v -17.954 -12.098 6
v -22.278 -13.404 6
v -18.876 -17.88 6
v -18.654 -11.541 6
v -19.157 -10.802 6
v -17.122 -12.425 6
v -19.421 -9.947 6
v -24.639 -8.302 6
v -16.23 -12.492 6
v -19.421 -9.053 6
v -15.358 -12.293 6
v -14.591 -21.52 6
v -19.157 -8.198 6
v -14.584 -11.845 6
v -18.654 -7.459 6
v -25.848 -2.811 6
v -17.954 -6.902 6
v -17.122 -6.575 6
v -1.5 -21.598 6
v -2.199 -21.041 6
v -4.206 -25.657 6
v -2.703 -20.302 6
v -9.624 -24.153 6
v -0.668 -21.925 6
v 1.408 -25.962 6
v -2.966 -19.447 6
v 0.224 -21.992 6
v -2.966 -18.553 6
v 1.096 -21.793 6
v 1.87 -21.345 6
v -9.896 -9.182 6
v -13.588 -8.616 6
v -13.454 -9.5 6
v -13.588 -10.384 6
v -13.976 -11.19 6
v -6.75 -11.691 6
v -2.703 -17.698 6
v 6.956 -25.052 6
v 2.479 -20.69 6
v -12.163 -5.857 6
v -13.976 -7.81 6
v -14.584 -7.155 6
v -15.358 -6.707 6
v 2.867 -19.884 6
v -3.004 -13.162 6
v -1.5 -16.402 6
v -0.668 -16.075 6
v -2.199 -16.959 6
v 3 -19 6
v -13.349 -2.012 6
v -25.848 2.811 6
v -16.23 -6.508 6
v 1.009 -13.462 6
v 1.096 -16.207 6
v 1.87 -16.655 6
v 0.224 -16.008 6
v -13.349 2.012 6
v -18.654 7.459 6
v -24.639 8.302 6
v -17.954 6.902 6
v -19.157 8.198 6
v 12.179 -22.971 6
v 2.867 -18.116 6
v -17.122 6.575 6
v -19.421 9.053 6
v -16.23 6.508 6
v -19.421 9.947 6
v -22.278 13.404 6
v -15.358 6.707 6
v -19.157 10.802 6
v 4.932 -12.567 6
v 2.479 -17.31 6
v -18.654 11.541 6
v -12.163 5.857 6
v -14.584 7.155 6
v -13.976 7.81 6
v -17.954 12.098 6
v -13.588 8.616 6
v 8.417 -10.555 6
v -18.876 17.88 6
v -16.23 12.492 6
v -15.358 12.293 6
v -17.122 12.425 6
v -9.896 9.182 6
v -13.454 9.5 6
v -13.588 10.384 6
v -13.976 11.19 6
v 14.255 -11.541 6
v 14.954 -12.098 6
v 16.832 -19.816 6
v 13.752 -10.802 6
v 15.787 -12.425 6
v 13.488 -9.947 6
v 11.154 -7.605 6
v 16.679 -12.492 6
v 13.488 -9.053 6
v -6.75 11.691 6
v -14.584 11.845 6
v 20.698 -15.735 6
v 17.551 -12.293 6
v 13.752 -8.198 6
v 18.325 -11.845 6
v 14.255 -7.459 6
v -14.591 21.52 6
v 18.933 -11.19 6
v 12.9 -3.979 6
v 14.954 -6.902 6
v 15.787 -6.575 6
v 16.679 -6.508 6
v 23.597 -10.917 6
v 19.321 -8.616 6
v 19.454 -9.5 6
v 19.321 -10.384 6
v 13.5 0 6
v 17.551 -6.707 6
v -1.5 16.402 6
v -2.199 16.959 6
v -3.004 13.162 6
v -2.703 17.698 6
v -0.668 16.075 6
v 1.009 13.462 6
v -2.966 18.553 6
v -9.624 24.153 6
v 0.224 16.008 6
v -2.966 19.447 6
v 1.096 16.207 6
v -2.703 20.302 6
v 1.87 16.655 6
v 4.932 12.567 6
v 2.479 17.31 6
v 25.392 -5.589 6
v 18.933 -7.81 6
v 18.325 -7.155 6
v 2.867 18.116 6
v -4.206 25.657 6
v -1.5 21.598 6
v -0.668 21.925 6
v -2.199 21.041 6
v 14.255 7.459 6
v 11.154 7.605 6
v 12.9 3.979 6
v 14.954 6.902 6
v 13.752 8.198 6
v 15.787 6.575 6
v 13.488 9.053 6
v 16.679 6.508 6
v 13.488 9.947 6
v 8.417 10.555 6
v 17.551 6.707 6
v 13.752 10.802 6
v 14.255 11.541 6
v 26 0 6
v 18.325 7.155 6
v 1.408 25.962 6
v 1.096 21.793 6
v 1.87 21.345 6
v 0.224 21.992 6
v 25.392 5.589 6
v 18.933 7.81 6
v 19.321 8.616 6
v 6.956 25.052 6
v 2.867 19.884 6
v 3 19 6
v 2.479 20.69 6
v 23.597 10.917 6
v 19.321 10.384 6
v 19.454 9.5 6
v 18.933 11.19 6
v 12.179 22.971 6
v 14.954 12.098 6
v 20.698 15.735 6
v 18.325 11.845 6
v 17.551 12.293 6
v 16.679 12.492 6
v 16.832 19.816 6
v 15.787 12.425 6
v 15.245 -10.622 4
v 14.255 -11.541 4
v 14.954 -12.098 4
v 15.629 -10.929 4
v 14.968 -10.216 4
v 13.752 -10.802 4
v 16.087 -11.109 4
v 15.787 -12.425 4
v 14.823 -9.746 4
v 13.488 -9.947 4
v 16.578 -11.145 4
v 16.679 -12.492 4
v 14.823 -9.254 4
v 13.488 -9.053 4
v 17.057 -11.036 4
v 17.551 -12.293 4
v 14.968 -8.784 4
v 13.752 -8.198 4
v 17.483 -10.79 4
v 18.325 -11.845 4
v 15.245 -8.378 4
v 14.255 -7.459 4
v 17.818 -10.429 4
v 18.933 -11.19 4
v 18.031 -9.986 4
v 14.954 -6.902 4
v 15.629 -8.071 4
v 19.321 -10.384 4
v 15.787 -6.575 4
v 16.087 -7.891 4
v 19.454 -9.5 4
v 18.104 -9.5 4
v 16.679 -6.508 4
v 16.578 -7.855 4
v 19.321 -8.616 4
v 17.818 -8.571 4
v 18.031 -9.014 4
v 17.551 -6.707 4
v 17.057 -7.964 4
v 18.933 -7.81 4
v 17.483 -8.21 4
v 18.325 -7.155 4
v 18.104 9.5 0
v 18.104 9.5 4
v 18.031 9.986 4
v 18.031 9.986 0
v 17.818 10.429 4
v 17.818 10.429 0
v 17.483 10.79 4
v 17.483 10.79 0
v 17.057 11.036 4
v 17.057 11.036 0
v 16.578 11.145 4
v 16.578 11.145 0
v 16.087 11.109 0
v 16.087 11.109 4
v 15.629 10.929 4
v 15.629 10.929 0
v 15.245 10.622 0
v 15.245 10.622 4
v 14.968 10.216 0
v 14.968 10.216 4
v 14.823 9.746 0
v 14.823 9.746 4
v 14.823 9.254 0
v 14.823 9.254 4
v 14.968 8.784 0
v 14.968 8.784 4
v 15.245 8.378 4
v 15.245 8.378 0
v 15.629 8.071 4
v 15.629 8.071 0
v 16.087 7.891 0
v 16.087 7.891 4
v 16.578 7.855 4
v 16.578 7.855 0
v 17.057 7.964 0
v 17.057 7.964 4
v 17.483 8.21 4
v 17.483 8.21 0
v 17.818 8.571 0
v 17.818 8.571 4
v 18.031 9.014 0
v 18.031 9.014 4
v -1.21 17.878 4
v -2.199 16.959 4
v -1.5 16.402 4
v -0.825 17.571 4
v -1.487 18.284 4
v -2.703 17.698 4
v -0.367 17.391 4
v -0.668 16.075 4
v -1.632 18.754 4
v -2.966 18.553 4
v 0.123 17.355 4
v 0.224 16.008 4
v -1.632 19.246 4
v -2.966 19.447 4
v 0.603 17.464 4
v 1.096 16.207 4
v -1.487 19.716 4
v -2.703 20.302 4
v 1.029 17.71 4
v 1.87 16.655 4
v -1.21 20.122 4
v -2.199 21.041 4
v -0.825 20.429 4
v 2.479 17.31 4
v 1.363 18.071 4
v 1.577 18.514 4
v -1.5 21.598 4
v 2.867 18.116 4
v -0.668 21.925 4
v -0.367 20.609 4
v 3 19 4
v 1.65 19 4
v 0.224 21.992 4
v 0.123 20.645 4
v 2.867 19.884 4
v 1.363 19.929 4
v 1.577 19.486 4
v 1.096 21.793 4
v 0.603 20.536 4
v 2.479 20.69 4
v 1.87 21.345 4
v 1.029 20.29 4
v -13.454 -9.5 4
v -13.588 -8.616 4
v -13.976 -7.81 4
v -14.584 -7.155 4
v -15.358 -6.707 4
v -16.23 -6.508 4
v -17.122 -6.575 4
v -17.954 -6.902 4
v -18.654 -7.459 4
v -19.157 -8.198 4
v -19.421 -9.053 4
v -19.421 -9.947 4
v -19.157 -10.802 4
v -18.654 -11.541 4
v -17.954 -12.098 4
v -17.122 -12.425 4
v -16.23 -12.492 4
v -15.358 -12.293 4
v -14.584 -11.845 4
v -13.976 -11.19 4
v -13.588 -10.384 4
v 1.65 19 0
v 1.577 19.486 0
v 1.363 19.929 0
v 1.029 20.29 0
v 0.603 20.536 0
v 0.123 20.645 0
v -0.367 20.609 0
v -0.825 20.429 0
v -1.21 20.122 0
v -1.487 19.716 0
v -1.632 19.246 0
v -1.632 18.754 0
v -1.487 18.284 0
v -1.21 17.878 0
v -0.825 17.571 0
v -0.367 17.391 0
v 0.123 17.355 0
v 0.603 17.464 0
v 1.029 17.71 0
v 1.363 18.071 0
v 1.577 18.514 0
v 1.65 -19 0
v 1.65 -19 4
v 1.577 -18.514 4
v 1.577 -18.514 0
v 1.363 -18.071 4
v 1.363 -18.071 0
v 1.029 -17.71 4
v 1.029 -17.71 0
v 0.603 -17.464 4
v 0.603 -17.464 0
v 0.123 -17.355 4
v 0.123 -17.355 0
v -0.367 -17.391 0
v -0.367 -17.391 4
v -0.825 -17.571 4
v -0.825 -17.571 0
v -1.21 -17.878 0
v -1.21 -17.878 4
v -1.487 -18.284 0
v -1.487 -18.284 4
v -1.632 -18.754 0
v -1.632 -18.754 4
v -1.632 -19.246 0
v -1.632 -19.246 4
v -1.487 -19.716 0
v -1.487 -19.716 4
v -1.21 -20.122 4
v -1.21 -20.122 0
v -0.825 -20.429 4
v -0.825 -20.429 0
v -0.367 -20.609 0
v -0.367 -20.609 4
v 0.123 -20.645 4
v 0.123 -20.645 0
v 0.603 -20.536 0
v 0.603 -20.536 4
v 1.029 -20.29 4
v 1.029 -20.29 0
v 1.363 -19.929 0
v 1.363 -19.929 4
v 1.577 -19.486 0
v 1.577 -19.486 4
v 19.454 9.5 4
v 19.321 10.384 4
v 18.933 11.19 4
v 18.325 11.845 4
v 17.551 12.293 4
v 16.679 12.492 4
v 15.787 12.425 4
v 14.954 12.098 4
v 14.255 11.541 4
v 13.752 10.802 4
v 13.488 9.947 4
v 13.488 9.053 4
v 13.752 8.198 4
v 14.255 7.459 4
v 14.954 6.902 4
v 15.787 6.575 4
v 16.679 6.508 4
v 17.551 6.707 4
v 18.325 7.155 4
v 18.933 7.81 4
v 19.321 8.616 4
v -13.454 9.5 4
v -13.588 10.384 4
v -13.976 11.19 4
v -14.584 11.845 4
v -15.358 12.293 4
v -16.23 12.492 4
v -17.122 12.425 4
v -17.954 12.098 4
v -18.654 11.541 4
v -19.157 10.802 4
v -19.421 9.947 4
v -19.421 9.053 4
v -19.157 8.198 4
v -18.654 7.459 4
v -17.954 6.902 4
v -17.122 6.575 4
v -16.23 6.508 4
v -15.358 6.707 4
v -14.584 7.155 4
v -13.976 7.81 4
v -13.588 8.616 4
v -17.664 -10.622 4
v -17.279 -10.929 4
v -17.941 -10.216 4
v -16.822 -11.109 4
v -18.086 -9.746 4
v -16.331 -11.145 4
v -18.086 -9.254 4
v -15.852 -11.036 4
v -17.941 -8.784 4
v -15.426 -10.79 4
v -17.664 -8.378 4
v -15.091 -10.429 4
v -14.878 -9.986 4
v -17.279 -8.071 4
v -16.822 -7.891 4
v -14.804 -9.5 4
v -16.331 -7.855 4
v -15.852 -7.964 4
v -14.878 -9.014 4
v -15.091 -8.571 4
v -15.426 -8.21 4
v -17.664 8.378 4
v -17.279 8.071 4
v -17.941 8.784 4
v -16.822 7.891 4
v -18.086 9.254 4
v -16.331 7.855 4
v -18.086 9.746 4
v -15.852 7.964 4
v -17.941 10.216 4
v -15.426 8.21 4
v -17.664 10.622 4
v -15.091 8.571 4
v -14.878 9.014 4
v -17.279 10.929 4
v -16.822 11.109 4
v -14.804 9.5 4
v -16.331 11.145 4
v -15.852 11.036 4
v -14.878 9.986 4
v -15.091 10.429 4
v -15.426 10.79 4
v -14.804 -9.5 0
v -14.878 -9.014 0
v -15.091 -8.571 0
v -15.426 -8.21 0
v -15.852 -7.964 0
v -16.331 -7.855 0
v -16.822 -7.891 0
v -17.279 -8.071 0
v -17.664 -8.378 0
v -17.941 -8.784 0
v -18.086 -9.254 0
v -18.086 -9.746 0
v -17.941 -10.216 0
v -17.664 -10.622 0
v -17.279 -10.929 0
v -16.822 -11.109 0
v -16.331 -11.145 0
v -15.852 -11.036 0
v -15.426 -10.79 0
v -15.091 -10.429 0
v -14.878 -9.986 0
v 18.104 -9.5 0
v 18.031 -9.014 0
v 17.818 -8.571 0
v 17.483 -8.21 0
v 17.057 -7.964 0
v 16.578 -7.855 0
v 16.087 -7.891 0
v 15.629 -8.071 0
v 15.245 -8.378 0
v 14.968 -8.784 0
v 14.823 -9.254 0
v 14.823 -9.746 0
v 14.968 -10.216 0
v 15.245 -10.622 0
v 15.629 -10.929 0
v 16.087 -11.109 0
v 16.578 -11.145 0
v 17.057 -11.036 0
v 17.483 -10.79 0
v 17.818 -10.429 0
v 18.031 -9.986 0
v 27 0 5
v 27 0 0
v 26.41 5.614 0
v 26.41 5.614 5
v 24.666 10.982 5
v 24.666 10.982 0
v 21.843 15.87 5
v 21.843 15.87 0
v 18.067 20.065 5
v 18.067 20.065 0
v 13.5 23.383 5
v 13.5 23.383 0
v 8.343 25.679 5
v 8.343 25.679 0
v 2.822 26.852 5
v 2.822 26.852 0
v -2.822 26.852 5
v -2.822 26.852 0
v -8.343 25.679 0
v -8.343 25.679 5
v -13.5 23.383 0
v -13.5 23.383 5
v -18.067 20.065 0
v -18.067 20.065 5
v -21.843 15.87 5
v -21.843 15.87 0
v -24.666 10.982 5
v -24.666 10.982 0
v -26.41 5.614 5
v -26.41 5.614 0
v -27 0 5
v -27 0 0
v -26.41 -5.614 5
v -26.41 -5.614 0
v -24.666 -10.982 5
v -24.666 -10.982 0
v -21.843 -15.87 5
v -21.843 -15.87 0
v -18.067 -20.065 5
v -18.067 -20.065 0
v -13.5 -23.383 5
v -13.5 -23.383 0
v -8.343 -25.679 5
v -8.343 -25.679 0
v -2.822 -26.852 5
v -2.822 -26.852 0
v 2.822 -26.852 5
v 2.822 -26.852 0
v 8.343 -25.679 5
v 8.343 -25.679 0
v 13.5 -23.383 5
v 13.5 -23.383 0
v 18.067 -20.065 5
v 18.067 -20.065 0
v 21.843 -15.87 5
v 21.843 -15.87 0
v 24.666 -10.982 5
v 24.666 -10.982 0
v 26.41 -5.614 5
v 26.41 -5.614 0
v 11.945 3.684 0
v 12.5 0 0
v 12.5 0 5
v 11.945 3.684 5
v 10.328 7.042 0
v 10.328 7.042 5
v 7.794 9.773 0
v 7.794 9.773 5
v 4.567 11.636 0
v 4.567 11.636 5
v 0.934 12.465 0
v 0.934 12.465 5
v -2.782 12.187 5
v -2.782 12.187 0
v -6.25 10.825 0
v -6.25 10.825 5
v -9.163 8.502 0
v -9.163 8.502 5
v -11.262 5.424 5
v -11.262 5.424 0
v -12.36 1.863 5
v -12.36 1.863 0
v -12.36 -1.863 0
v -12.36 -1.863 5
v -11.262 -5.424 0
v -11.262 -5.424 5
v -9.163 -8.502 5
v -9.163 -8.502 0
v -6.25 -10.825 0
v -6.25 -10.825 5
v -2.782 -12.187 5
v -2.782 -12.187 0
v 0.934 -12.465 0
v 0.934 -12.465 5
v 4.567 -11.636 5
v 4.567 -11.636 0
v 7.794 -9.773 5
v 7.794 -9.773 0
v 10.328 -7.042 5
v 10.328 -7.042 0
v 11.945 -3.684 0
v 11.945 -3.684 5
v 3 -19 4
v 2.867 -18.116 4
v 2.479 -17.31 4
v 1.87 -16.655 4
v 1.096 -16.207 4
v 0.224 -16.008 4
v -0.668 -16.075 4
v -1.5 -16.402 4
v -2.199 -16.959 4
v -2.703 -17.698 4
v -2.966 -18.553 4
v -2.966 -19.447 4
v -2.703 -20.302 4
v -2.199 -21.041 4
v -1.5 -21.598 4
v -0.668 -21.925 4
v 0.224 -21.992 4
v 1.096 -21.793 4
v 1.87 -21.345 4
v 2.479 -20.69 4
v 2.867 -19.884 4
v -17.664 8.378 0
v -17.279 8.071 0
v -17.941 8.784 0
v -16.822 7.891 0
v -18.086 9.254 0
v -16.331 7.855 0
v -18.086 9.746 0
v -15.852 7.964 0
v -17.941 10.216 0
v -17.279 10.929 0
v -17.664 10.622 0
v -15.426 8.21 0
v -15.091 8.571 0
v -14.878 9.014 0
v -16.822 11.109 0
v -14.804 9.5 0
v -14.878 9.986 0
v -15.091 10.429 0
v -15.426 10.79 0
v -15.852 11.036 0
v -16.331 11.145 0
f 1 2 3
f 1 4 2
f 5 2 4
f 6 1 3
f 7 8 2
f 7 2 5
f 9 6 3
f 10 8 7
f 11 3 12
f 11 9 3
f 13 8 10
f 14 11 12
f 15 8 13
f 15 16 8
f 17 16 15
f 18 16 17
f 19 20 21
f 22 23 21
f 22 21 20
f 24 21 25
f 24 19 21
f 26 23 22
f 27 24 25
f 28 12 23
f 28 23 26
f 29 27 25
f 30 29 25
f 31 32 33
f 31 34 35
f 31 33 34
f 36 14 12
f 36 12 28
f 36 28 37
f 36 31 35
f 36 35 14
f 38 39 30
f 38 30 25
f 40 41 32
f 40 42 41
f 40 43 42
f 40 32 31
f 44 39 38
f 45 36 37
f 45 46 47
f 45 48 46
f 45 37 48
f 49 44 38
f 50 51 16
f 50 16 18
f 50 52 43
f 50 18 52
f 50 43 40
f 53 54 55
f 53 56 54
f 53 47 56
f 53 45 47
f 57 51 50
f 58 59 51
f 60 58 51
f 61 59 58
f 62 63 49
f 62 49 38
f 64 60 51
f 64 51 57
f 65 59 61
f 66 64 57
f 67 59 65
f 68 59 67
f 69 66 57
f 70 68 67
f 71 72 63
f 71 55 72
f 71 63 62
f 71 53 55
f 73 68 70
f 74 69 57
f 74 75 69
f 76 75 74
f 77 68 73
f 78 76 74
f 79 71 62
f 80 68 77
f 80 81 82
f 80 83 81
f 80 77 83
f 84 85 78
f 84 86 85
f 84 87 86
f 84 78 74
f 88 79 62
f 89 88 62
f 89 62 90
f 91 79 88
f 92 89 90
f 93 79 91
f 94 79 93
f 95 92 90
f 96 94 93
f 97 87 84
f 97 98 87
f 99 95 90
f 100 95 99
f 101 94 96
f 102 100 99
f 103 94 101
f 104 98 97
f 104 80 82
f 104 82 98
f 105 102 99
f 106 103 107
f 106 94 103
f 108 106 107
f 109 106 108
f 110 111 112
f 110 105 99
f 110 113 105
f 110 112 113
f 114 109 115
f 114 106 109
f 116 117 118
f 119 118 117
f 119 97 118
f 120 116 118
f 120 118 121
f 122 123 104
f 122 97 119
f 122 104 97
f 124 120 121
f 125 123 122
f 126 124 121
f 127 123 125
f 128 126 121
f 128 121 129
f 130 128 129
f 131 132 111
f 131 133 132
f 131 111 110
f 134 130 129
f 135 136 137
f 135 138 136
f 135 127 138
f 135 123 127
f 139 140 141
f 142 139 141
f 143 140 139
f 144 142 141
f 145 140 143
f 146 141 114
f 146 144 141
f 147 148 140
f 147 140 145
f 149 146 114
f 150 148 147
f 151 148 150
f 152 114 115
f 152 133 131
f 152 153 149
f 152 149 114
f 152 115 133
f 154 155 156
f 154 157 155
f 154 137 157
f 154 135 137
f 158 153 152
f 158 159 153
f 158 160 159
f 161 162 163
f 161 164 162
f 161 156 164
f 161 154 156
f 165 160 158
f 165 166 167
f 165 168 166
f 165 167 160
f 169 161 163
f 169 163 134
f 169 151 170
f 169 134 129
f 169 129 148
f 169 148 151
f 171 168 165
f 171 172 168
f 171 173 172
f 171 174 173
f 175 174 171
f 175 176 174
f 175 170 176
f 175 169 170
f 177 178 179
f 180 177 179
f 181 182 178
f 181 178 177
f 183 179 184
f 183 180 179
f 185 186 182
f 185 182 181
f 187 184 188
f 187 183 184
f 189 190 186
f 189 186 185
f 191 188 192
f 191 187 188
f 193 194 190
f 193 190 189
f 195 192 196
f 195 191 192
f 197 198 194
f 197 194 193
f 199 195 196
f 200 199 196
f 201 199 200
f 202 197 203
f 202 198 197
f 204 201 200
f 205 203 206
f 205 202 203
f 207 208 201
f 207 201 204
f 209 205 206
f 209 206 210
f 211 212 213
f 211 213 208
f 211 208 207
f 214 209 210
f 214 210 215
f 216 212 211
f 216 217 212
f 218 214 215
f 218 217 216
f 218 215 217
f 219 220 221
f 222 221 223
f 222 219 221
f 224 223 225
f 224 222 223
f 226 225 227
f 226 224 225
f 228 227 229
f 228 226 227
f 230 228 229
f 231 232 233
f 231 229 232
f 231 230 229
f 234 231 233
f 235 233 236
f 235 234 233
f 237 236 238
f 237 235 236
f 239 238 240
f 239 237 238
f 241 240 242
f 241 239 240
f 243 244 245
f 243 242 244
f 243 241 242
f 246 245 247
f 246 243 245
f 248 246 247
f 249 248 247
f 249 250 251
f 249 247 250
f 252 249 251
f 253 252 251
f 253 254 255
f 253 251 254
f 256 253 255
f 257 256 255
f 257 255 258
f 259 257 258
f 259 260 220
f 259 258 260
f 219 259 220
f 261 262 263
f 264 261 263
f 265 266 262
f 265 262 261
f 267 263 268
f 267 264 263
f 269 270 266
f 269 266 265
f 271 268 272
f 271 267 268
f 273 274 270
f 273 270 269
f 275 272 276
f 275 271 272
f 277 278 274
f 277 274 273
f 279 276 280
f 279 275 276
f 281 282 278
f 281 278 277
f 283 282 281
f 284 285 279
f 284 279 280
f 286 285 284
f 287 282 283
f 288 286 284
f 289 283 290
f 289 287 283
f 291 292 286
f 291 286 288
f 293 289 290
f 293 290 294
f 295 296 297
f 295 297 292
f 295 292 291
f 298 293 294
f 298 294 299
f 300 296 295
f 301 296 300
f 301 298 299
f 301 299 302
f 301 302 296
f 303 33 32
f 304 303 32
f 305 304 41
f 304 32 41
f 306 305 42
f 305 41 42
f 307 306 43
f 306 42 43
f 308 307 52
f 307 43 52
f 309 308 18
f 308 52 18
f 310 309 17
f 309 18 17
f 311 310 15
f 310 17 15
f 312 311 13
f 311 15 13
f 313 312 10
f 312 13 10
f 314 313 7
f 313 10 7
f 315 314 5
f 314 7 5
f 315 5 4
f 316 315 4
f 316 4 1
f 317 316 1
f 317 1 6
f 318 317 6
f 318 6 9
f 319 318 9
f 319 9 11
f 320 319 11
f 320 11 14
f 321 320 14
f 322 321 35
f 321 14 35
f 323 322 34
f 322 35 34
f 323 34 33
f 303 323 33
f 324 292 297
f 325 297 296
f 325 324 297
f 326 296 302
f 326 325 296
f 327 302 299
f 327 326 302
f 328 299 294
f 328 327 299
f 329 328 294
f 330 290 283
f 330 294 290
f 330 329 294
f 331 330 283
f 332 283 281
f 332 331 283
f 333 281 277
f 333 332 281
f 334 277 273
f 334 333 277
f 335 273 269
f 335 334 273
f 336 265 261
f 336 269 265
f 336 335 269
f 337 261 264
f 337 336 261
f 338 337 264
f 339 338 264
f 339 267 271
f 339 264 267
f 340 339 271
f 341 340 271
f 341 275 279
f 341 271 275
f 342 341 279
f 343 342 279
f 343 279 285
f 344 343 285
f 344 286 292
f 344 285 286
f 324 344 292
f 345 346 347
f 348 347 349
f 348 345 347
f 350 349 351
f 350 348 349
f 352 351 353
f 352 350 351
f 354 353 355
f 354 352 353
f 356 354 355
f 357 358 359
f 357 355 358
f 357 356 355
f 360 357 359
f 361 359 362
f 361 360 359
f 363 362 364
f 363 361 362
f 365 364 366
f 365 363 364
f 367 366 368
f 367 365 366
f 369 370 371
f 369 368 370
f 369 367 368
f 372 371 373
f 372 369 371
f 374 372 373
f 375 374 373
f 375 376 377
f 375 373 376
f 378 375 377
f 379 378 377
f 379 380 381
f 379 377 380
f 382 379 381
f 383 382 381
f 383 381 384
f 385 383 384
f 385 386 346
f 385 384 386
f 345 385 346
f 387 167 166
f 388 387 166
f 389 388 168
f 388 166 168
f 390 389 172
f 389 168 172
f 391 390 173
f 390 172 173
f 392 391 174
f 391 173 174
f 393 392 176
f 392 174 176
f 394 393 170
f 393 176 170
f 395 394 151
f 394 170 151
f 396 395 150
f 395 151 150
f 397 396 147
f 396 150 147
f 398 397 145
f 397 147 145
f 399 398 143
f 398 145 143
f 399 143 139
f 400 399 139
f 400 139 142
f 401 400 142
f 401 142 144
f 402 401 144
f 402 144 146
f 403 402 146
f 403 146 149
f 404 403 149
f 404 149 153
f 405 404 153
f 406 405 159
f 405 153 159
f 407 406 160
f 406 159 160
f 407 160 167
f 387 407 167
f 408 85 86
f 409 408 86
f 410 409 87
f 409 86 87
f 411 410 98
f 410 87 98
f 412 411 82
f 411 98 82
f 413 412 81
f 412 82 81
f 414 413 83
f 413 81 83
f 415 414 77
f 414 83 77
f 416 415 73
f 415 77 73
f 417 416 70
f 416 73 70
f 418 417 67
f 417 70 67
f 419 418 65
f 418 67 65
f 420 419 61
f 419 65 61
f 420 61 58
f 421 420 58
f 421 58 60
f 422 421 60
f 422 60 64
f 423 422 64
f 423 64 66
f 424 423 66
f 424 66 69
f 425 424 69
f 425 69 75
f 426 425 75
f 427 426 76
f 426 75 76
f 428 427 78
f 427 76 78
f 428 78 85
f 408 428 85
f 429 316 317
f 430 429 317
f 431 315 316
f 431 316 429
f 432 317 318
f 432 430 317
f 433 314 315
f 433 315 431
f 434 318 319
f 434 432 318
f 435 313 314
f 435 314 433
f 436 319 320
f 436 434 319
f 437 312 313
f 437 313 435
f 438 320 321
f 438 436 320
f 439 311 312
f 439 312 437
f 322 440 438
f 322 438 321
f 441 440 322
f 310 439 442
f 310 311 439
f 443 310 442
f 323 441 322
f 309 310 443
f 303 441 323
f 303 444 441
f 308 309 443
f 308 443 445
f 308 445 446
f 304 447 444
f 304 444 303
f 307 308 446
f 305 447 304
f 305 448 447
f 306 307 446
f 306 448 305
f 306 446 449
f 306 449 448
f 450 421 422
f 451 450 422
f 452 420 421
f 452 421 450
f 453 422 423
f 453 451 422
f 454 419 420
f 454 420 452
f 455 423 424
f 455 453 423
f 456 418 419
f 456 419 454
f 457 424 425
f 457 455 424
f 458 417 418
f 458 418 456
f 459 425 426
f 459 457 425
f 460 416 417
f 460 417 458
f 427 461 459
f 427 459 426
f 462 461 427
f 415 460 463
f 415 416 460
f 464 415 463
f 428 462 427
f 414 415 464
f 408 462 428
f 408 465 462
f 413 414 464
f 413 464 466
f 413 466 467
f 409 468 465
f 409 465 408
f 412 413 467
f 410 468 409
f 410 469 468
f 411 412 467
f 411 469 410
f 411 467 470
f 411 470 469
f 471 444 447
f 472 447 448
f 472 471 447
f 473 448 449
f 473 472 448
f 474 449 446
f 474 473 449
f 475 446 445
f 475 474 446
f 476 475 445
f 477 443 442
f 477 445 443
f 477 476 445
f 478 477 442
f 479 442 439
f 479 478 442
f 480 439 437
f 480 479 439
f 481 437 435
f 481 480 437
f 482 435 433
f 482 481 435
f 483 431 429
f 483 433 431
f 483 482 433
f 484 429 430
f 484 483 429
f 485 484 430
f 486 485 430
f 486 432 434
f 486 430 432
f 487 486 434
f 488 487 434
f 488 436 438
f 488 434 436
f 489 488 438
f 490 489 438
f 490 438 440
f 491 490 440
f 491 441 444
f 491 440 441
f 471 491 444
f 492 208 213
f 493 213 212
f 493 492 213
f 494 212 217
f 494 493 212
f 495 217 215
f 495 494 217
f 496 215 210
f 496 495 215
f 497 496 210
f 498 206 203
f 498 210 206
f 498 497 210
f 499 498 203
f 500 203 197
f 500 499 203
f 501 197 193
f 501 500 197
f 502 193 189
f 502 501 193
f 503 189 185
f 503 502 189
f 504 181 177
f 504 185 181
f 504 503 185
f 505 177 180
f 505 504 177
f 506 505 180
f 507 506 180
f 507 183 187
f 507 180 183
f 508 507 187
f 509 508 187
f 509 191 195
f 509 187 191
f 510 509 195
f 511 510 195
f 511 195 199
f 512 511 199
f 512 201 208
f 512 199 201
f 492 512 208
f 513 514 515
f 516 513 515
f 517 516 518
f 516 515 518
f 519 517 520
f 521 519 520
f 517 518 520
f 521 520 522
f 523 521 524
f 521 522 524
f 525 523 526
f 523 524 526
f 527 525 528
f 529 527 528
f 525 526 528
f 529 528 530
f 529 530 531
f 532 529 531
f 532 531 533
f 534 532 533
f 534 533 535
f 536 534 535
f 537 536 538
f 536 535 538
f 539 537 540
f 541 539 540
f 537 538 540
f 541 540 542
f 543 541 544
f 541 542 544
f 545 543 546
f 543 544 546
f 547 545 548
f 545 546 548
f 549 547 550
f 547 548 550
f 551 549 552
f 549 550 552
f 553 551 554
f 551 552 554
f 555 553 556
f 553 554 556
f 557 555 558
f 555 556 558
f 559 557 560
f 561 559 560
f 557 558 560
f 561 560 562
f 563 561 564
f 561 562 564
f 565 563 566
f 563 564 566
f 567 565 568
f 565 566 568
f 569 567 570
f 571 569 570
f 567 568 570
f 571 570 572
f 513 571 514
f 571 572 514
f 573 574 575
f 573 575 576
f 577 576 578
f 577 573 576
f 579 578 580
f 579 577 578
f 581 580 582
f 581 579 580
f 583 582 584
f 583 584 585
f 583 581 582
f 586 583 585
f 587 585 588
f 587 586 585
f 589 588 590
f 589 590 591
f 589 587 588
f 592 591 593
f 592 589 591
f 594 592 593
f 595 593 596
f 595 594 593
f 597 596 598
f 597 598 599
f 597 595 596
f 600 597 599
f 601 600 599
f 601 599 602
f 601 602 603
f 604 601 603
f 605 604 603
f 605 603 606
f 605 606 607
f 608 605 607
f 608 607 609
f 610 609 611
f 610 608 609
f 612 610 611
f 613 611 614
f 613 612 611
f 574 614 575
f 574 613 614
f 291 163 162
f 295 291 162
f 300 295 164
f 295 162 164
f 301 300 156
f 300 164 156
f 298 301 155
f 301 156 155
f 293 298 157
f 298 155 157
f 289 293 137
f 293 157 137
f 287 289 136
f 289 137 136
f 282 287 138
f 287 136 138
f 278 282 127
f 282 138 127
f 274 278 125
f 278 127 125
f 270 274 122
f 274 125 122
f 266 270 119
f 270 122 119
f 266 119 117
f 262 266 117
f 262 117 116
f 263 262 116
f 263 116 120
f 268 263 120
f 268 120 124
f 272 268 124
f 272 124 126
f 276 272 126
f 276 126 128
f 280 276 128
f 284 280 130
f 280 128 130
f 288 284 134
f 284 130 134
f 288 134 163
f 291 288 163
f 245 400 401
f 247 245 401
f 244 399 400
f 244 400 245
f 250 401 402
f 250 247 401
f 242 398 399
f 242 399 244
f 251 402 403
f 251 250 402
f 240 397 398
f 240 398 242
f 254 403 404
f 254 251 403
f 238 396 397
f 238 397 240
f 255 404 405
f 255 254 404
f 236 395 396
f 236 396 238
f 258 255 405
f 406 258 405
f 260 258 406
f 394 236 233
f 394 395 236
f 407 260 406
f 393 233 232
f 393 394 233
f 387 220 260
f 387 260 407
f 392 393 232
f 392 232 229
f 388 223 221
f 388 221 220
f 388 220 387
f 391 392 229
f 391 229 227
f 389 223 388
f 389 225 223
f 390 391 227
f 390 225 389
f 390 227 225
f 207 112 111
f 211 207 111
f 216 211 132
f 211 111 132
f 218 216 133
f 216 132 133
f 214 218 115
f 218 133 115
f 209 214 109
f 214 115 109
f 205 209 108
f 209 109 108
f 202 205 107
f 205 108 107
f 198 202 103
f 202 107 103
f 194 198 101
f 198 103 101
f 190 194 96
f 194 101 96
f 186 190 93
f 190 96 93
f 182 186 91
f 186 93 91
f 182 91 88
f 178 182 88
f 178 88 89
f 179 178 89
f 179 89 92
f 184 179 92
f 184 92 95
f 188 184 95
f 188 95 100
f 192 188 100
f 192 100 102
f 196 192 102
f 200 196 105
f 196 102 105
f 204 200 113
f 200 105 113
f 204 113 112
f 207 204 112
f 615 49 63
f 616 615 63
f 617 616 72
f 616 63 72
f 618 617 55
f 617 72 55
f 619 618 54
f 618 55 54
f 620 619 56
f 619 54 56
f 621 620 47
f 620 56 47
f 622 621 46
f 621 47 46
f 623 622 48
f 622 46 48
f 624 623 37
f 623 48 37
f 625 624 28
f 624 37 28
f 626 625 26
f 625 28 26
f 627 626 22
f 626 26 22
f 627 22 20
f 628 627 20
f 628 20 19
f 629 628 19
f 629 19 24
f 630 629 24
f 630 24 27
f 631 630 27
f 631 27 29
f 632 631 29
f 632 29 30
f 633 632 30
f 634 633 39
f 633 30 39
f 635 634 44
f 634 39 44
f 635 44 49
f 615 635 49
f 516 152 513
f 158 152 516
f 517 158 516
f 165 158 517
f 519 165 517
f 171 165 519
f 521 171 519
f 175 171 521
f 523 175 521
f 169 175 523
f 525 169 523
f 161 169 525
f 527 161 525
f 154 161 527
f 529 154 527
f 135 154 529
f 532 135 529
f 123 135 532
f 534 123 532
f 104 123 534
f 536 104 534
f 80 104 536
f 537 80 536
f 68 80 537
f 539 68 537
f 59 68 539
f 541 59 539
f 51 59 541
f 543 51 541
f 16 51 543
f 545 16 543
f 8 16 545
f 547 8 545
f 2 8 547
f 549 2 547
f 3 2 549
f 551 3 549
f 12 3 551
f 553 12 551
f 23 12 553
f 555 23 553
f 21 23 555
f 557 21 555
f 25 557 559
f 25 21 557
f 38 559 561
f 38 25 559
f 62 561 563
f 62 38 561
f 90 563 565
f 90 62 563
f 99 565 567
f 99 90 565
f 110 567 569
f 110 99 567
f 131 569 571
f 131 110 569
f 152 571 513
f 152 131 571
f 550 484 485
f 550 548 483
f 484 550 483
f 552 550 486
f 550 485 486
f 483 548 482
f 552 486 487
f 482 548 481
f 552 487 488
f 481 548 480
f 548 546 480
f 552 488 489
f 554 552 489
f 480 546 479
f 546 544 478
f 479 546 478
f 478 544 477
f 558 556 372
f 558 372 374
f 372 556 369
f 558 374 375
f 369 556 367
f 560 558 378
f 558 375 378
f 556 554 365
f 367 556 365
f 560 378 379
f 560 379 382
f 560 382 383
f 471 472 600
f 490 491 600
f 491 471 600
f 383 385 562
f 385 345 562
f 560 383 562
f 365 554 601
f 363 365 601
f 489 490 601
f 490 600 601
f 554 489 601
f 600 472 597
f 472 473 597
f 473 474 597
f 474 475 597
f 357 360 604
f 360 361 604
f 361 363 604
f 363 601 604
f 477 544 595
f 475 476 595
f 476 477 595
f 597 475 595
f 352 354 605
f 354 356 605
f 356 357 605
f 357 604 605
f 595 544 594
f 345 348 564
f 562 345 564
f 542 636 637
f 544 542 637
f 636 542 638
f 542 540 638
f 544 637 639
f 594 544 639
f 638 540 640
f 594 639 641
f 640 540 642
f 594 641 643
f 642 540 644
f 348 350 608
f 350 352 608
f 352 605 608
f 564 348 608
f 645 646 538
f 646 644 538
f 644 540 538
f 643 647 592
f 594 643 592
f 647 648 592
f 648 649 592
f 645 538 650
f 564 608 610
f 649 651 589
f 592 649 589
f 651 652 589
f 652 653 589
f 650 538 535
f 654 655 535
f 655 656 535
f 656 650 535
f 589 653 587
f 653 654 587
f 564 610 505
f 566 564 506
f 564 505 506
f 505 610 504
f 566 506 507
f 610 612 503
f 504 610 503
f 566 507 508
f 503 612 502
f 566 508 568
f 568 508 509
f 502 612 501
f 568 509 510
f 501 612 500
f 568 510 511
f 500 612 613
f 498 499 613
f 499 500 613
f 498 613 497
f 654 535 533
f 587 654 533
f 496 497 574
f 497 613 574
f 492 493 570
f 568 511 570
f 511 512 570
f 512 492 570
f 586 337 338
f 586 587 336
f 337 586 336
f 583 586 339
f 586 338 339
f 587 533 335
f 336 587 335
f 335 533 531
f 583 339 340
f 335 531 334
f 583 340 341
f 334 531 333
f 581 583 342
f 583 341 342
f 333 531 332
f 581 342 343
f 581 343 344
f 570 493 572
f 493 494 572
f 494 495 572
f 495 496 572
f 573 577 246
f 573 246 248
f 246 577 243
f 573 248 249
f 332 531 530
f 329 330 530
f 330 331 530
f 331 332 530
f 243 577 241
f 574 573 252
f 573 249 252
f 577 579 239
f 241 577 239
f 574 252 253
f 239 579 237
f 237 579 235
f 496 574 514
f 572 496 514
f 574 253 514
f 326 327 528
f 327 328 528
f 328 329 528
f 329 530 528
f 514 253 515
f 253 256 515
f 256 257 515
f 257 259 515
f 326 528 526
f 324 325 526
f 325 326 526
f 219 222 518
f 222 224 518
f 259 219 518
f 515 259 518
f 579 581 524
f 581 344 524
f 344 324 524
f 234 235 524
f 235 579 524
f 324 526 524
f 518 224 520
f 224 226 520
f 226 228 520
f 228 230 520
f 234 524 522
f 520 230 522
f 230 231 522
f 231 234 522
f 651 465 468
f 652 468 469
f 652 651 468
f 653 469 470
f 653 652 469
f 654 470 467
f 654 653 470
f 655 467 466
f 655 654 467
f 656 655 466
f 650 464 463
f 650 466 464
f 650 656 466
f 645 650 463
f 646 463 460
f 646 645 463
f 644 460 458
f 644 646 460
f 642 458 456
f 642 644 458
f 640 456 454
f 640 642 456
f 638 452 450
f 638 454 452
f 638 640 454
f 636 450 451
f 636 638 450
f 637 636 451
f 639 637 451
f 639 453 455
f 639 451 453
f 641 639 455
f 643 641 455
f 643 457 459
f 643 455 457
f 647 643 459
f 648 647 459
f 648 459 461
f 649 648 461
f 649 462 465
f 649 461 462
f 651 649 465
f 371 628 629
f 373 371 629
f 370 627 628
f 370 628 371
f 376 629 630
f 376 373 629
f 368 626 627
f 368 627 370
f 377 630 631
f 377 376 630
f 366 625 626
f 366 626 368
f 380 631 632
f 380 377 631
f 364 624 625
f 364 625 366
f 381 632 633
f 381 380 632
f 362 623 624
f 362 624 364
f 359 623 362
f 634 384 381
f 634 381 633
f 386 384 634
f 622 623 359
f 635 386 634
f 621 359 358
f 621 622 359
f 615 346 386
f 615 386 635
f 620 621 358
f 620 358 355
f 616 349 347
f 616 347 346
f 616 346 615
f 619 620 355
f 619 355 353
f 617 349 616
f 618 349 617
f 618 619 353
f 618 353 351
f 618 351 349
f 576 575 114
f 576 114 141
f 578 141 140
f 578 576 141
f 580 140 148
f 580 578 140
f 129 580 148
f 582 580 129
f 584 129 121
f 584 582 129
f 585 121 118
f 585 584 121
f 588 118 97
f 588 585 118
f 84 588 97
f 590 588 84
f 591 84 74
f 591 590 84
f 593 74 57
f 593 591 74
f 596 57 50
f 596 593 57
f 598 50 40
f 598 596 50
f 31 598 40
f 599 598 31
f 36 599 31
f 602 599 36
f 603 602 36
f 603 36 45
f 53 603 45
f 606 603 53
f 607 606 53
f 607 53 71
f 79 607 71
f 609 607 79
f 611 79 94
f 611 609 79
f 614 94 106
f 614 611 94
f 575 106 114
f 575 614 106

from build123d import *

# Parameters (mm, degrees)
SKETCH1_R           = 27
SKETCH1_R_2         = 1.65
SKETCH1_R_3         = 12.5
BOSS_EXTRUDE1_DEPTH = 6
SKETCH2_R           = 3
CUT_EXTRUDE1_DEPTH  = 2
CHAMFER1_SIZE       = 1


with BuildPart() as part:
    # Sketch1 → Boss-Extrude1 (new body)
    with BuildSketch(Plane.XY):
        Circle(SKETCH1_R)
        with Locations((0, 19)):
            Circle(SKETCH1_R_2, mode=Mode.SUBTRACT)
        with Locations((16.454482672, 9.5)):
            Circle(SKETCH1_R_2, mode=Mode.SUBTRACT)
        with Locations((16.454482672, -9.5)):
            Circle(SKETCH1_R_2, mode=Mode.SUBTRACT)
        with Locations((0, -19)):
            Circle(SKETCH1_R_2, mode=Mode.SUBTRACT)
        with Locations((-16.454482672, -9.5)):
            Circle(SKETCH1_R_2, mode=Mode.SUBTRACT)
        with Locations((-16.454482672, 9.5)):
            Circle(SKETCH1_R_2, mode=Mode.SUBTRACT)
        Circle(SKETCH1_R_3, mode=Mode.SUBTRACT)
    extrude(amount=BOSS_EXTRUDE1_DEPTH)

    # Sketch2 → Cut-Extrude1 (cut)
    with BuildSketch(Plane.XY.offset(6)):
        with Locations((0, 19)):
            Circle(SKETCH2_R)
        with Locations((16.454482672, 9.5)):
            Circle(SKETCH2_R)
        with Locations((16.454482672, -9.5)):
            Circle(SKETCH2_R)
        with Locations((0, -19)):
            Circle(SKETCH2_R)
        with Locations((-16.454482672, -9.5)):
            Circle(SKETCH2_R)
        with Locations((-16.454482672, 9.5)):
            Circle(SKETCH2_R)
    extrude(amount=-CUT_EXTRUDE1_DEPTH, mode=Mode.SUBTRACT)

    # Chamfer1
    chamfer1_edges = [part.edges().sort_by_distance(p)[0] for p in [
        (-27, 0, 6),
        (-12.5, 0, 6),
    ]]
    chamfer(chamfer1_edges, length=CHAMFER1_SIZE)


solid = part.part
